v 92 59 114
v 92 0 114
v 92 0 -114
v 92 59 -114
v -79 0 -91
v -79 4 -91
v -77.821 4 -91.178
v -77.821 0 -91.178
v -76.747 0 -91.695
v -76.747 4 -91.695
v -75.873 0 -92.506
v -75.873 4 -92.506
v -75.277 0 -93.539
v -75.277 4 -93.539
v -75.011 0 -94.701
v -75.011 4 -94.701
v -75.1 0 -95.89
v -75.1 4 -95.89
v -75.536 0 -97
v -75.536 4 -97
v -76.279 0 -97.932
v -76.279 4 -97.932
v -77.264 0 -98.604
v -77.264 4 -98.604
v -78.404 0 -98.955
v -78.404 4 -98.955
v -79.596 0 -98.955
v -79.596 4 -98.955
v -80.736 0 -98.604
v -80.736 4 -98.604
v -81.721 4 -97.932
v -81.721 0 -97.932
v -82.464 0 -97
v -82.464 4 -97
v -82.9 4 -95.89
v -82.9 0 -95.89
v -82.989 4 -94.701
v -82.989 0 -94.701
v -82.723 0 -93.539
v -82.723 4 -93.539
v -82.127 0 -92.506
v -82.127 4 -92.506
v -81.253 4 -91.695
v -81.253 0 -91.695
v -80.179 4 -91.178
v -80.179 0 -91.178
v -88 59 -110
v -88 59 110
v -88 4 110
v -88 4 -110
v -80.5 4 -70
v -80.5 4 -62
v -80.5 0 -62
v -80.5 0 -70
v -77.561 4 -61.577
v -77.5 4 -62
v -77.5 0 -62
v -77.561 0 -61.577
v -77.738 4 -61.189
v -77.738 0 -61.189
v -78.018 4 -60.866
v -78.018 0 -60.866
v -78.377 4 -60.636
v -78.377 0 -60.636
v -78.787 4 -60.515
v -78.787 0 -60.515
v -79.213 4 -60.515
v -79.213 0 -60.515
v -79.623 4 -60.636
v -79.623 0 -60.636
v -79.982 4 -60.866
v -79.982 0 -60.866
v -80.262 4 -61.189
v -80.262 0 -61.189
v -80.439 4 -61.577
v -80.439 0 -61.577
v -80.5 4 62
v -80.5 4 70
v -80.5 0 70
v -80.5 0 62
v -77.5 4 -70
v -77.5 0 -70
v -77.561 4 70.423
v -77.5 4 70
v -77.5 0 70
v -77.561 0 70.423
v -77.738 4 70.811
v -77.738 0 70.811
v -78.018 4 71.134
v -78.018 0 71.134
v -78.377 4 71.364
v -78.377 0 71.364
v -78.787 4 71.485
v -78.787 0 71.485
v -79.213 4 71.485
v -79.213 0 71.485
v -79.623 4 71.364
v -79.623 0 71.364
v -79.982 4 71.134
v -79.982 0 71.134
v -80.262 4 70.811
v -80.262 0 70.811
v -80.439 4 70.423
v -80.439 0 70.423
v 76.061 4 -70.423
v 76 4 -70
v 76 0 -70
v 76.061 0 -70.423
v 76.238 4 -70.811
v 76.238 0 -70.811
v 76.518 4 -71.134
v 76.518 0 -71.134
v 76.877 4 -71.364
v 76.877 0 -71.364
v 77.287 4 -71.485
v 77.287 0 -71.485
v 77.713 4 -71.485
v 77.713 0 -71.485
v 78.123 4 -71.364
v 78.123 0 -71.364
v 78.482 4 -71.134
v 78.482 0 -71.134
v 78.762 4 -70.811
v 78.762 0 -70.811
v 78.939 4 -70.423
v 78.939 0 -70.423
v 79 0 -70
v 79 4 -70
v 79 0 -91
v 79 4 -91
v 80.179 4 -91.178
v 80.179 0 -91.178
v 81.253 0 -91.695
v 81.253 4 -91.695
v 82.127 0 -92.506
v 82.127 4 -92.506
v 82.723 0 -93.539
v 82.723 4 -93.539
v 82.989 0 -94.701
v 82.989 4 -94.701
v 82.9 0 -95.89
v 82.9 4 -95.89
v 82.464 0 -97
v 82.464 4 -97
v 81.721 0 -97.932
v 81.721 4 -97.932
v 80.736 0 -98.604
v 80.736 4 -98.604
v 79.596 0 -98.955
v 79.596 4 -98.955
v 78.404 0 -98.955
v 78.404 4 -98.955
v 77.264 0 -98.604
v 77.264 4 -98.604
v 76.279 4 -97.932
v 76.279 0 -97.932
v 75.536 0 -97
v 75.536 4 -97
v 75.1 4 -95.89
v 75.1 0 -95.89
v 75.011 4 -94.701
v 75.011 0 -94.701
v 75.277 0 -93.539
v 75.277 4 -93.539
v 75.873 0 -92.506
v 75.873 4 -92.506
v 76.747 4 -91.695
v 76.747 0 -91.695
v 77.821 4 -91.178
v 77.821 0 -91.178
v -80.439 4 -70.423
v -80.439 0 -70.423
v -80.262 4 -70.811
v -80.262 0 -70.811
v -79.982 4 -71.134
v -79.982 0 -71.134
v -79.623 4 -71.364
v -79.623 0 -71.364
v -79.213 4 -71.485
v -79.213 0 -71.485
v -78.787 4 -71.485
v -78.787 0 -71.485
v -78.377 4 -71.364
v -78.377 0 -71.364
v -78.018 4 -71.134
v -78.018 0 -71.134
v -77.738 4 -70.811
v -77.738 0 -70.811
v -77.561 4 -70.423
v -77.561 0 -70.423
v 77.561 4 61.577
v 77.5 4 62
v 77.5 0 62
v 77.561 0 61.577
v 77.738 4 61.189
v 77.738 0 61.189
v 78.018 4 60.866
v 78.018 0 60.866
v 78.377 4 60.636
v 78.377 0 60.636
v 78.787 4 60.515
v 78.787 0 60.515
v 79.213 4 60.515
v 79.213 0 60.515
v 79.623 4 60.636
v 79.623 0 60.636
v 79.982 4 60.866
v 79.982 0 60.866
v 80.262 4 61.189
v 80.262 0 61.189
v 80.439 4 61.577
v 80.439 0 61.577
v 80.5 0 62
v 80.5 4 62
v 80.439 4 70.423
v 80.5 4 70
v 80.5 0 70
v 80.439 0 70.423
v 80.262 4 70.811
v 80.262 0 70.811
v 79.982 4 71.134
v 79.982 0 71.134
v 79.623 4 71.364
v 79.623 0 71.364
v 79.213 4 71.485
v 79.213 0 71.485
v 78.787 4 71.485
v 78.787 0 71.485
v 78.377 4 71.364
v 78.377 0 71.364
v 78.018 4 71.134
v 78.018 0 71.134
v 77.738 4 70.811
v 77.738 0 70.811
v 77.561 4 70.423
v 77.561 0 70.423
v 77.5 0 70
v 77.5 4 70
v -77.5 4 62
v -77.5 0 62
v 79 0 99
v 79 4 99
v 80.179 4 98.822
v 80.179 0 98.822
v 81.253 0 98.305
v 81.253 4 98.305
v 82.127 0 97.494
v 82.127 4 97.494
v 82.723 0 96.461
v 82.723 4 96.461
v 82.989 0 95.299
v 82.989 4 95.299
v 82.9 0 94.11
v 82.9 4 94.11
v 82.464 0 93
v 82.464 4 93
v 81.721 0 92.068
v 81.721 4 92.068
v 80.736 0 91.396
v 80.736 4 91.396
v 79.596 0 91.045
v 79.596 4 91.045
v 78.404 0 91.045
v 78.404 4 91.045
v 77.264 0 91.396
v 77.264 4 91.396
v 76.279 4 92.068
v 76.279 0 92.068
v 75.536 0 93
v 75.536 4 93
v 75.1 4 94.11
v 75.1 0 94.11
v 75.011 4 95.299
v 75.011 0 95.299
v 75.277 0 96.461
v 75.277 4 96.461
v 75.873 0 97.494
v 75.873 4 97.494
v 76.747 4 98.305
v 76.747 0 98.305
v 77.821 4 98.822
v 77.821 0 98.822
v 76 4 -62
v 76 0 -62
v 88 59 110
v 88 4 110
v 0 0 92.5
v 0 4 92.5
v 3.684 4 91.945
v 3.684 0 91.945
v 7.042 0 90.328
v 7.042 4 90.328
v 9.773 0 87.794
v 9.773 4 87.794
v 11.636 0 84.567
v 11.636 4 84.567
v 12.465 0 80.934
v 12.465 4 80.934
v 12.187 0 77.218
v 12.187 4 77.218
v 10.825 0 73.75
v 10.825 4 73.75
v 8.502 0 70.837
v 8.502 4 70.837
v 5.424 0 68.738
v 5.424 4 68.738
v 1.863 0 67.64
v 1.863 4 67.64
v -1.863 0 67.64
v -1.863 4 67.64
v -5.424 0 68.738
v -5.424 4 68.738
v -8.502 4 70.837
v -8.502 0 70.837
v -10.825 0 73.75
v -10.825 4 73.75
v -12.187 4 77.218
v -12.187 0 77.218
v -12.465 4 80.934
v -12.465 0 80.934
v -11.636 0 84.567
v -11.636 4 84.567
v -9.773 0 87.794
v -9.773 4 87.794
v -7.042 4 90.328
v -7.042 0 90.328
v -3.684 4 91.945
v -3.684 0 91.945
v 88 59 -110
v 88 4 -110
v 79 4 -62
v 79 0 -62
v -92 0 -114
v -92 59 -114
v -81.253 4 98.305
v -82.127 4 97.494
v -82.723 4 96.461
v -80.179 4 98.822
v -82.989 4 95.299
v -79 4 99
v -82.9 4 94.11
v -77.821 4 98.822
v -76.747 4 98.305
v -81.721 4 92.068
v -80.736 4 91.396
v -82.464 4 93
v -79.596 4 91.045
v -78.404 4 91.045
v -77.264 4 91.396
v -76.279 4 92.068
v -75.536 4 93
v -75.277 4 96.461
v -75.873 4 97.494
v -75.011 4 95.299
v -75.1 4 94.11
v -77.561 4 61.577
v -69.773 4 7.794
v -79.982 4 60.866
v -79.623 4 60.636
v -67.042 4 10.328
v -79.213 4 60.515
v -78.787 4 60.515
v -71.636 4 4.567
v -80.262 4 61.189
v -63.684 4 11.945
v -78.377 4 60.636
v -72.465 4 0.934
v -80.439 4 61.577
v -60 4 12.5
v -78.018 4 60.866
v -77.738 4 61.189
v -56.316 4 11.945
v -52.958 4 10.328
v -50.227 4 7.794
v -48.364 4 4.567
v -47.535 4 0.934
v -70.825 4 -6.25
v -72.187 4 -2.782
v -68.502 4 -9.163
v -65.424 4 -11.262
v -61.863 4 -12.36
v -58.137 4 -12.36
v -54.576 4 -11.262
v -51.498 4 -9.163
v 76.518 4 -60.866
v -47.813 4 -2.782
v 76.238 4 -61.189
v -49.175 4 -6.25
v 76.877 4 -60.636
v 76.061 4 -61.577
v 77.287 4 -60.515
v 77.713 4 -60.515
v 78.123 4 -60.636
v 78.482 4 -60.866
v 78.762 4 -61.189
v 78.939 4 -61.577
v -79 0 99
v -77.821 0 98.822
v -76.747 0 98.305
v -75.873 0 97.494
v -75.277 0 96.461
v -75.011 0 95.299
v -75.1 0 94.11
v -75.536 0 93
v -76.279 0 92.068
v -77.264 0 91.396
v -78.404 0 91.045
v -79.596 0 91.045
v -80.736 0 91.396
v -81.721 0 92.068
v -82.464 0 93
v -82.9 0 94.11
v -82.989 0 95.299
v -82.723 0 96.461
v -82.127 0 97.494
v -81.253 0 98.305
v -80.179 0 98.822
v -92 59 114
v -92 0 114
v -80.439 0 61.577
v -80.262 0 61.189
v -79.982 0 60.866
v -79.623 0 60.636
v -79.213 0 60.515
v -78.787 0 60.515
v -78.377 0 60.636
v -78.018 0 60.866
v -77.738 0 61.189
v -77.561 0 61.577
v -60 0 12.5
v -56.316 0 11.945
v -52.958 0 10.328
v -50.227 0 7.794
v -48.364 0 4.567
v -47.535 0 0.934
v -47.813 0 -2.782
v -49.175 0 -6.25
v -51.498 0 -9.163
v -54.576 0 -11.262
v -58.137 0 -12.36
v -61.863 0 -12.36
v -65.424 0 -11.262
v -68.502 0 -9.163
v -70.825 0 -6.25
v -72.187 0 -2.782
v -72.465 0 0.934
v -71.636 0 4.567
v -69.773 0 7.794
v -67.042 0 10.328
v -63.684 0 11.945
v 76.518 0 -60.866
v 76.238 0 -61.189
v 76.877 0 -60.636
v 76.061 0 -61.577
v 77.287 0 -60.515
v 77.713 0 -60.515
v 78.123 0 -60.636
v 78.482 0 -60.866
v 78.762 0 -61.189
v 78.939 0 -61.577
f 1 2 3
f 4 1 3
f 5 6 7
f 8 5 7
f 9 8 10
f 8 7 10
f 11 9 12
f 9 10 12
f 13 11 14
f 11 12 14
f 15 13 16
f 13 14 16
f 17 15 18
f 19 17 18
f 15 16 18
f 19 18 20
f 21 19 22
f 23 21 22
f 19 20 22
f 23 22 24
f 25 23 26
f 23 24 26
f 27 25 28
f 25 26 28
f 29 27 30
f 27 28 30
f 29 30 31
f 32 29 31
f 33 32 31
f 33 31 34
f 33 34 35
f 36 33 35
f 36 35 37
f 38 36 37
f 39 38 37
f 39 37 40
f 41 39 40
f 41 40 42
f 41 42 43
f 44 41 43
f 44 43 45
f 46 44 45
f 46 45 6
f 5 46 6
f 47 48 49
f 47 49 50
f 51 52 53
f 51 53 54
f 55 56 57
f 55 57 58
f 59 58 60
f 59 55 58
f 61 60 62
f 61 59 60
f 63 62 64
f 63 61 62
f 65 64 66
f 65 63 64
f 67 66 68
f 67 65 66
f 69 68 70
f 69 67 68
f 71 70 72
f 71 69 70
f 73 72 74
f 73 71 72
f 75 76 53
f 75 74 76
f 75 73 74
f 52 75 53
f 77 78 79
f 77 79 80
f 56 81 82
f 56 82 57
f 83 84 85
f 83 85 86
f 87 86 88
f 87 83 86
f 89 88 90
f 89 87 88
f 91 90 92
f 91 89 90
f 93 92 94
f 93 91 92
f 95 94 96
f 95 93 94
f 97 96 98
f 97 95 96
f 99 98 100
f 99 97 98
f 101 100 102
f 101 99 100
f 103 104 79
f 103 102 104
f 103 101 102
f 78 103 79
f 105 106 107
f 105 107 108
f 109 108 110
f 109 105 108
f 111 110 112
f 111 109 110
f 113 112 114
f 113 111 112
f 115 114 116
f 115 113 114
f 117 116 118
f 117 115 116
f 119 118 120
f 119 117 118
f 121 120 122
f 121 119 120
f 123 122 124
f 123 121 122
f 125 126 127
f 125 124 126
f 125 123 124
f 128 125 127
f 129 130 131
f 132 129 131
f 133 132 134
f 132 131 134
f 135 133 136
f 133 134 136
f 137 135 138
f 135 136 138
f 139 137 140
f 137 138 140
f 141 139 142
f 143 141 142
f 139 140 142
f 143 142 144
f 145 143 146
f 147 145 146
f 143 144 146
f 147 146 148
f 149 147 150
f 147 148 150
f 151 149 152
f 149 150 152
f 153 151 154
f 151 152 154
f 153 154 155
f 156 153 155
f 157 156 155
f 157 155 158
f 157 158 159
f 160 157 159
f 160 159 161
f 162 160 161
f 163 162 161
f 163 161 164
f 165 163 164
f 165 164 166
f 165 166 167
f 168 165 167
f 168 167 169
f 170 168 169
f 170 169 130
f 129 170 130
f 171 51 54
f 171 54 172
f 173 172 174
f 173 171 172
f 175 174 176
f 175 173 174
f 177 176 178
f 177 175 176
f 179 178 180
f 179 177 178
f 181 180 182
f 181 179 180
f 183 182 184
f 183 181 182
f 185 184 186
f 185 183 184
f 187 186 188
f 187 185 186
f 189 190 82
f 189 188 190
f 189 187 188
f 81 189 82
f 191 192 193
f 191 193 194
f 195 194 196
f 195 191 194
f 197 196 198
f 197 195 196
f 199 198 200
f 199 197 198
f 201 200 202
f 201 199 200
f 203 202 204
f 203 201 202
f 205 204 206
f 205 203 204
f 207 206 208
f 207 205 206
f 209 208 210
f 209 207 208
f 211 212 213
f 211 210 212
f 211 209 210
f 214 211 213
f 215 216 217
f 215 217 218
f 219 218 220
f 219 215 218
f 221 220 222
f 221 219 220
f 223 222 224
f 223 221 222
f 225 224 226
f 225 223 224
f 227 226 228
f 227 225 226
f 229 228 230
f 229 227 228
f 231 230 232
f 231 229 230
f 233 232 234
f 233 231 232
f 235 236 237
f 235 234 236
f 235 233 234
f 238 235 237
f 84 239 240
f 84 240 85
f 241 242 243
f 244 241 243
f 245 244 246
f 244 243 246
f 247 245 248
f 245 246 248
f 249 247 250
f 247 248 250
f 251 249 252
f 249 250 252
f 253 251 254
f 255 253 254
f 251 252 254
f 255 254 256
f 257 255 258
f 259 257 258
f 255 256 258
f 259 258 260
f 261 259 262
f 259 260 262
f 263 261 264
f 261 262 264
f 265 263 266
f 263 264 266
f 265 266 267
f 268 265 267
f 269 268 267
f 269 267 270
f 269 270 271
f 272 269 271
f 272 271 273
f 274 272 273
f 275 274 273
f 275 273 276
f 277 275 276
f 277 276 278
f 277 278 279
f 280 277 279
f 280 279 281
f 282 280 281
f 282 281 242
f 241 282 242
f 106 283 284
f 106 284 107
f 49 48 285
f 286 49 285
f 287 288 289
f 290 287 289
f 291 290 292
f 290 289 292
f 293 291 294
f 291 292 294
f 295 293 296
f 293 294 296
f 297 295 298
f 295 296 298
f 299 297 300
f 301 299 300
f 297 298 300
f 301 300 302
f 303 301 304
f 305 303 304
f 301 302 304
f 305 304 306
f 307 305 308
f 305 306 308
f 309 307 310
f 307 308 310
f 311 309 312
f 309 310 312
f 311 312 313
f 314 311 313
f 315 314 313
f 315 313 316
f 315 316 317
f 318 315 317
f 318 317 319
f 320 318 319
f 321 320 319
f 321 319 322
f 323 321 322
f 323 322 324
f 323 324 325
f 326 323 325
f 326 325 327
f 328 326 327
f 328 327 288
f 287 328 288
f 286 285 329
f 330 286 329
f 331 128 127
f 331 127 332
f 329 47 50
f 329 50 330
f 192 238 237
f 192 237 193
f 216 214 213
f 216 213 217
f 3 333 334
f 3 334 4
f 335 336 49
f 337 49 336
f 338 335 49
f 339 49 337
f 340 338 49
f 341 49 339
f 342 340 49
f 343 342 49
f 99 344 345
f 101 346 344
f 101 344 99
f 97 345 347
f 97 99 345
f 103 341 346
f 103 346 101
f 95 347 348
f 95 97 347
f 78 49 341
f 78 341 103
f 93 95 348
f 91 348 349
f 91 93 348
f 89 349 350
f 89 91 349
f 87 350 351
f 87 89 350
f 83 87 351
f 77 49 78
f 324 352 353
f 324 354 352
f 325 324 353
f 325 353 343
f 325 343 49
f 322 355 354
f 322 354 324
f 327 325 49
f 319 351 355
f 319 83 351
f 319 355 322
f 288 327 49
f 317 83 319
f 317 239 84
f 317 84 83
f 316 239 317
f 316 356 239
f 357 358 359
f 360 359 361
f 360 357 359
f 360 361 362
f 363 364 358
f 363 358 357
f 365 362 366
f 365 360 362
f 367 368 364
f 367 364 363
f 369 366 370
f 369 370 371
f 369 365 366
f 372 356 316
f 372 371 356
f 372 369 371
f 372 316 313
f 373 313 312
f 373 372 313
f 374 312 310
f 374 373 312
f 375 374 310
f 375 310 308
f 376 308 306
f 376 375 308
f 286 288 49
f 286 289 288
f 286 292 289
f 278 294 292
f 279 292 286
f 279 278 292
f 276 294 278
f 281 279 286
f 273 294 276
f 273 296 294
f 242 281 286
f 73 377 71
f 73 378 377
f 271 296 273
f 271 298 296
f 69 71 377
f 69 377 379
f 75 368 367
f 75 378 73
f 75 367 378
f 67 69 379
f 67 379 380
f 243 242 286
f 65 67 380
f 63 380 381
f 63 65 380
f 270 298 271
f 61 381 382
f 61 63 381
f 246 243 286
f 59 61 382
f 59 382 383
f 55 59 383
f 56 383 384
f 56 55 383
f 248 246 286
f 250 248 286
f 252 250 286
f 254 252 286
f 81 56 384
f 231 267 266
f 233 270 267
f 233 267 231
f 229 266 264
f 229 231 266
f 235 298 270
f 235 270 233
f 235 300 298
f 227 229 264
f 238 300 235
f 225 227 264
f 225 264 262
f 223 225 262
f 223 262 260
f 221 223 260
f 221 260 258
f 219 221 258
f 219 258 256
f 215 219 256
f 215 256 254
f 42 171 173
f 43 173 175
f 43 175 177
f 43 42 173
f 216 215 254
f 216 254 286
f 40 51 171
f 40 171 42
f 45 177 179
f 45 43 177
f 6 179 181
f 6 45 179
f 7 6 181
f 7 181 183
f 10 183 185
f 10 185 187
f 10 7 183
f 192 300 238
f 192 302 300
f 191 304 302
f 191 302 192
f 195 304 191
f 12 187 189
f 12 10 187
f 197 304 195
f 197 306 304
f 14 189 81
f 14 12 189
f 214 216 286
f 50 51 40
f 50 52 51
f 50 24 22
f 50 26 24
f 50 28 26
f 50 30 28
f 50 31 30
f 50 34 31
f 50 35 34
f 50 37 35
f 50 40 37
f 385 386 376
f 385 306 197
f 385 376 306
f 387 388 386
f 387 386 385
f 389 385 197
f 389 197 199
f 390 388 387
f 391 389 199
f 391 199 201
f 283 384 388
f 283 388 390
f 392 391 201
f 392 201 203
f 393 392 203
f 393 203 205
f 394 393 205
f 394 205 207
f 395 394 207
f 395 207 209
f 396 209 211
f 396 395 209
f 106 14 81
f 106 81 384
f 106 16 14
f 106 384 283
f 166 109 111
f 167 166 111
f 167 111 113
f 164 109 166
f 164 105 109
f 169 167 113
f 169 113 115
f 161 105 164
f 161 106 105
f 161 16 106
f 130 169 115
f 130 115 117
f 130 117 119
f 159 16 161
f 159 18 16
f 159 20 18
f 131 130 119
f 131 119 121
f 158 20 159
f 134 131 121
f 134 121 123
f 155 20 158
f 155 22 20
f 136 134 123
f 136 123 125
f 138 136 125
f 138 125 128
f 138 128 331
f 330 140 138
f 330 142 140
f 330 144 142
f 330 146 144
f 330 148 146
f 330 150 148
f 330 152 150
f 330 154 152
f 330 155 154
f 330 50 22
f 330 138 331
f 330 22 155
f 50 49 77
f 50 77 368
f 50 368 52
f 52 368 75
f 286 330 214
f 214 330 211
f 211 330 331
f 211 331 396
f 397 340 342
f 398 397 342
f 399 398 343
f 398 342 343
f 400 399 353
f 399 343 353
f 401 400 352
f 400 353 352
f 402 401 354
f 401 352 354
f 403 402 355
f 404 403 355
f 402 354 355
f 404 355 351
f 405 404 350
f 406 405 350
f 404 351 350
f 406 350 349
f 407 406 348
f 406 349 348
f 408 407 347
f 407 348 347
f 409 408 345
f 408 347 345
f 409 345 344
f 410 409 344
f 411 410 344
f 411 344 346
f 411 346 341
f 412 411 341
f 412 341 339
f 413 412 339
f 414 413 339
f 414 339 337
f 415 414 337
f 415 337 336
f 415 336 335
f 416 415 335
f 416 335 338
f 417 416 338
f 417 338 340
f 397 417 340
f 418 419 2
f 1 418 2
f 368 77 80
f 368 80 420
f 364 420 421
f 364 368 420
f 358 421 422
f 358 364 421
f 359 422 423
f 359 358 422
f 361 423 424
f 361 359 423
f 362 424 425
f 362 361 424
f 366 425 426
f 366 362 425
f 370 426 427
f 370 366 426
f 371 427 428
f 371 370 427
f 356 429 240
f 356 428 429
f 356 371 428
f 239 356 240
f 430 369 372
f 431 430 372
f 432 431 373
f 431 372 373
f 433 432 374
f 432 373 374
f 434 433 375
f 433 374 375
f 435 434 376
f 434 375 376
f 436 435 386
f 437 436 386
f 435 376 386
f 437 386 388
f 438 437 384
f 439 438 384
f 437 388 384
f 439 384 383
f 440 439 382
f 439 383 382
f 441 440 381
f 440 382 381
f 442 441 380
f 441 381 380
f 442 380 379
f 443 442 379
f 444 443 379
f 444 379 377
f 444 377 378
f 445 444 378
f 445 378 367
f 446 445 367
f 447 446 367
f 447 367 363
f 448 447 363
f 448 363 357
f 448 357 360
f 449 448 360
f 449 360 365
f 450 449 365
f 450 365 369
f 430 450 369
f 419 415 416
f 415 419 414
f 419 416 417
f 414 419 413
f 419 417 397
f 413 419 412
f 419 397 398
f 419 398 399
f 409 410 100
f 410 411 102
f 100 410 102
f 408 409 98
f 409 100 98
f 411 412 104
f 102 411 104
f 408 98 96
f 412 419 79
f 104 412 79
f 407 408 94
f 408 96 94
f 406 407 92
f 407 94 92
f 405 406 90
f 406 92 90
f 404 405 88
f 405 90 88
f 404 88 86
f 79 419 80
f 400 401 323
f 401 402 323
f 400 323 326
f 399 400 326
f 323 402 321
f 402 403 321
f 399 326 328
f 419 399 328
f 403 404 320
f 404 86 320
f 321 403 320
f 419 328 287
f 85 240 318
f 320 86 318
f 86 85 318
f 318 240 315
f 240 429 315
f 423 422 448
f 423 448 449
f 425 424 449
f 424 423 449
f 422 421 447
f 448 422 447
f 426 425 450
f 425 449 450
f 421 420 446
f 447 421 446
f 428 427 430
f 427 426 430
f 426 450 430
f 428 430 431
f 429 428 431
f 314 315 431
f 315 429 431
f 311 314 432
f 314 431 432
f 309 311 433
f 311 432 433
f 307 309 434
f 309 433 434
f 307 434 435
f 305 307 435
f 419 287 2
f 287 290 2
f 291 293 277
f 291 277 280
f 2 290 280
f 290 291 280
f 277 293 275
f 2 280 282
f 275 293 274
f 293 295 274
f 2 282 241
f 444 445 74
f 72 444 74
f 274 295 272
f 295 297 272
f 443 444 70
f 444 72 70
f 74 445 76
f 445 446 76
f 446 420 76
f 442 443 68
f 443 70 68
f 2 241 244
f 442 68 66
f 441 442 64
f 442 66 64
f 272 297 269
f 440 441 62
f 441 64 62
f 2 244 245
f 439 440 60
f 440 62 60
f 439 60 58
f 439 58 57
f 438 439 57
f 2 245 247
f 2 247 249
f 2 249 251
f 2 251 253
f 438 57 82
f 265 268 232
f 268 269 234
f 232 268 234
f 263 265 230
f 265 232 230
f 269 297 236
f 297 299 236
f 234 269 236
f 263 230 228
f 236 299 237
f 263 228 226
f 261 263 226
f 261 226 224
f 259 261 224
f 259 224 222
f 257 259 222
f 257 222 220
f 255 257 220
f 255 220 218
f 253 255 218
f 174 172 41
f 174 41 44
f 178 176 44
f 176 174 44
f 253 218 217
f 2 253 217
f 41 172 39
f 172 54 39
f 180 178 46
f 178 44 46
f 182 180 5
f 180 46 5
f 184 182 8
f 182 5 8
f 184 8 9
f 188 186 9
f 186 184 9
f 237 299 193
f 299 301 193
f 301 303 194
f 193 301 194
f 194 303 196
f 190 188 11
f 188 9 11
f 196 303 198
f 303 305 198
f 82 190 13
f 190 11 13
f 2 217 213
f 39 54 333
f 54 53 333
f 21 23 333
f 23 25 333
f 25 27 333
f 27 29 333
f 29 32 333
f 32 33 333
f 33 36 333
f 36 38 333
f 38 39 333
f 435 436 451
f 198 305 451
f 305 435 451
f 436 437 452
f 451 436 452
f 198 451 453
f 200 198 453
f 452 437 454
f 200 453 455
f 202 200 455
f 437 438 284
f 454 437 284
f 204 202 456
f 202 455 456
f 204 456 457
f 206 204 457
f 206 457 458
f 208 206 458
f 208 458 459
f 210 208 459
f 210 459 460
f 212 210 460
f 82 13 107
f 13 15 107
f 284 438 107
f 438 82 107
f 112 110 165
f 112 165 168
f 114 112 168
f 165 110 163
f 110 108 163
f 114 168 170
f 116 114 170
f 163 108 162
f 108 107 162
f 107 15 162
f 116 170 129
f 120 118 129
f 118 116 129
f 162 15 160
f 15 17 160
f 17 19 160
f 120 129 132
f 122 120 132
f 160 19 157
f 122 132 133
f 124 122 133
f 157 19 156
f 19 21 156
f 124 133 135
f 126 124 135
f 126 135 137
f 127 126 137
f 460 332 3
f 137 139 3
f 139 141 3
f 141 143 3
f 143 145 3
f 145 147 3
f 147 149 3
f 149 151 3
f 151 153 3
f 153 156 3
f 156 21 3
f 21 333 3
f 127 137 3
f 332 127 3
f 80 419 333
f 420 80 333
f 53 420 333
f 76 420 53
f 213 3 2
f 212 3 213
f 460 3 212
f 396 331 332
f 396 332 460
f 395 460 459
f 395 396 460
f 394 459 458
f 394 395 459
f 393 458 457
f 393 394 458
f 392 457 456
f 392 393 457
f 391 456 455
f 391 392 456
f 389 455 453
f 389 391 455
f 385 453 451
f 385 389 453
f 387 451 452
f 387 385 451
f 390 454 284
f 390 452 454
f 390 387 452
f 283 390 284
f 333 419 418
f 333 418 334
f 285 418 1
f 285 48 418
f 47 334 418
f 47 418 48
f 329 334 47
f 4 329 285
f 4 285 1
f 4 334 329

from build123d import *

# Parameters (mm, degrees)
SKETCH1_W           = 184
SKETCH1_H           = 228
BOSS_EXTRUDE1_DEPTH = 59
SKETCH2_W           = 176
SKETCH2_H           = 220
CUT_EXTRUDE1_DEPTH  = 55
SKETCH4_R           = 4
CUT_EXTRUDE2_DEPTH  = 157.476835346
SKETCH6_R           = 12.5
CUT_EXTRUDE3_DEPTH  = 157.476835346


with BuildPart() as part:
    # Sketch1 → Boss-Extrude1 (new body)
    with BuildSketch(Plane(origin=(0, 0, 0), x_dir=(1, 0, 0), z_dir=(0, 1, 0))):
        Rectangle(SKETCH1_W, SKETCH1_H)
    extrude(amount=BOSS_EXTRUDE1_DEPTH)

    # Sketch2 → Cut-Extrude1 (cut)
    with BuildSketch(Plane(origin=(0, 59, 0), x_dir=(1, 0, 0), z_dir=(0, 1, 0))):
        Rectangle(SKETCH2_W, SKETCH2_H)
    extrude(amount=-CUT_EXTRUDE1_DEPTH, mode=Mode.SUBTRACT)

    # Sketch4 → Cut-Extrude2 (cut, through all)
    with BuildSketch(Plane(origin=(0, 4, 0), x_dir=(1, 0, 0), z_dir=(0, 1, 0))):
        with Locations(Location((-79, -95, 0), (0, 0, 270))):
            Circle(SKETCH4_R)
        with Locations(Location((-79, 95, 0), (0, 0, 270))):
            Circle(SKETCH4_R)
        with Locations(Location((79, -95, 0), (0, 0, 270))):
            Circle(SKETCH4_R)
        with Locations(Location((79, 95, 0), (0, 0, 270))):
            Circle(SKETCH4_R)
        with BuildLine():
            Line((-77.5, 70), (-77.5, 62))
            ThreePointArc((-77.5, 62), (-79, 60.5), (-80.5, 62))
            Line((-80.5, 62), (-80.5, 70))
            ThreePointArc((-80.5, 70), (-79, 71.5), (-77.5, 70))
        make_face()
        with BuildLine():
            Line((-77.5, -62), (-77.5, -70))
            ThreePointArc((-77.5, -70), (-79, -71.5), (-80.5, -70))
            Line((-80.5, -70), (-80.5, -62))
            ThreePointArc((-80.5, -62), (-79, -60.5), (-77.5, -62))
        make_face()
        with BuildLine():
            Line((80.5, -62), (80.5, -70))
            ThreePointArc((80.5, -70), (79, -71.5), (77.5, -70))
            Line((77.5, -70), (77.5, -62))
            ThreePointArc((77.5, -62), (79, -60.5), (80.5, -62))
        make_face()
        with BuildLine():
            Line((79, 70), (79, 62))
            ThreePointArc((79, 62), (77.5, 60.5), (76, 62))
            Line((76, 62), (76, 70))
            ThreePointArc((76, 70), (77.5, 71.5), (79, 70))
        make_face()
    extrude(amount=-CUT_EXTRUDE2_DEPTH, mode=Mode.SUBTRACT)

    # Sketch6 → Cut-Extrude3 (cut, through all)
    with BuildSketch(Plane(origin=(0, 4, 0), x_dir=(1, 0, 0), z_dir=(0, 1, 0))):
        with Locations(Location((-60, 0, 0), (0, 0, 270))):
            Circle(SKETCH6_R)
        with Locations(Location((0, -80, 0), (0, 0, 270))):
            Circle(SKETCH6_R)
    extrude(amount=-CUT_EXTRUDE3_DEPTH, mode=Mode.SUBTRACT)


solid = part.part
